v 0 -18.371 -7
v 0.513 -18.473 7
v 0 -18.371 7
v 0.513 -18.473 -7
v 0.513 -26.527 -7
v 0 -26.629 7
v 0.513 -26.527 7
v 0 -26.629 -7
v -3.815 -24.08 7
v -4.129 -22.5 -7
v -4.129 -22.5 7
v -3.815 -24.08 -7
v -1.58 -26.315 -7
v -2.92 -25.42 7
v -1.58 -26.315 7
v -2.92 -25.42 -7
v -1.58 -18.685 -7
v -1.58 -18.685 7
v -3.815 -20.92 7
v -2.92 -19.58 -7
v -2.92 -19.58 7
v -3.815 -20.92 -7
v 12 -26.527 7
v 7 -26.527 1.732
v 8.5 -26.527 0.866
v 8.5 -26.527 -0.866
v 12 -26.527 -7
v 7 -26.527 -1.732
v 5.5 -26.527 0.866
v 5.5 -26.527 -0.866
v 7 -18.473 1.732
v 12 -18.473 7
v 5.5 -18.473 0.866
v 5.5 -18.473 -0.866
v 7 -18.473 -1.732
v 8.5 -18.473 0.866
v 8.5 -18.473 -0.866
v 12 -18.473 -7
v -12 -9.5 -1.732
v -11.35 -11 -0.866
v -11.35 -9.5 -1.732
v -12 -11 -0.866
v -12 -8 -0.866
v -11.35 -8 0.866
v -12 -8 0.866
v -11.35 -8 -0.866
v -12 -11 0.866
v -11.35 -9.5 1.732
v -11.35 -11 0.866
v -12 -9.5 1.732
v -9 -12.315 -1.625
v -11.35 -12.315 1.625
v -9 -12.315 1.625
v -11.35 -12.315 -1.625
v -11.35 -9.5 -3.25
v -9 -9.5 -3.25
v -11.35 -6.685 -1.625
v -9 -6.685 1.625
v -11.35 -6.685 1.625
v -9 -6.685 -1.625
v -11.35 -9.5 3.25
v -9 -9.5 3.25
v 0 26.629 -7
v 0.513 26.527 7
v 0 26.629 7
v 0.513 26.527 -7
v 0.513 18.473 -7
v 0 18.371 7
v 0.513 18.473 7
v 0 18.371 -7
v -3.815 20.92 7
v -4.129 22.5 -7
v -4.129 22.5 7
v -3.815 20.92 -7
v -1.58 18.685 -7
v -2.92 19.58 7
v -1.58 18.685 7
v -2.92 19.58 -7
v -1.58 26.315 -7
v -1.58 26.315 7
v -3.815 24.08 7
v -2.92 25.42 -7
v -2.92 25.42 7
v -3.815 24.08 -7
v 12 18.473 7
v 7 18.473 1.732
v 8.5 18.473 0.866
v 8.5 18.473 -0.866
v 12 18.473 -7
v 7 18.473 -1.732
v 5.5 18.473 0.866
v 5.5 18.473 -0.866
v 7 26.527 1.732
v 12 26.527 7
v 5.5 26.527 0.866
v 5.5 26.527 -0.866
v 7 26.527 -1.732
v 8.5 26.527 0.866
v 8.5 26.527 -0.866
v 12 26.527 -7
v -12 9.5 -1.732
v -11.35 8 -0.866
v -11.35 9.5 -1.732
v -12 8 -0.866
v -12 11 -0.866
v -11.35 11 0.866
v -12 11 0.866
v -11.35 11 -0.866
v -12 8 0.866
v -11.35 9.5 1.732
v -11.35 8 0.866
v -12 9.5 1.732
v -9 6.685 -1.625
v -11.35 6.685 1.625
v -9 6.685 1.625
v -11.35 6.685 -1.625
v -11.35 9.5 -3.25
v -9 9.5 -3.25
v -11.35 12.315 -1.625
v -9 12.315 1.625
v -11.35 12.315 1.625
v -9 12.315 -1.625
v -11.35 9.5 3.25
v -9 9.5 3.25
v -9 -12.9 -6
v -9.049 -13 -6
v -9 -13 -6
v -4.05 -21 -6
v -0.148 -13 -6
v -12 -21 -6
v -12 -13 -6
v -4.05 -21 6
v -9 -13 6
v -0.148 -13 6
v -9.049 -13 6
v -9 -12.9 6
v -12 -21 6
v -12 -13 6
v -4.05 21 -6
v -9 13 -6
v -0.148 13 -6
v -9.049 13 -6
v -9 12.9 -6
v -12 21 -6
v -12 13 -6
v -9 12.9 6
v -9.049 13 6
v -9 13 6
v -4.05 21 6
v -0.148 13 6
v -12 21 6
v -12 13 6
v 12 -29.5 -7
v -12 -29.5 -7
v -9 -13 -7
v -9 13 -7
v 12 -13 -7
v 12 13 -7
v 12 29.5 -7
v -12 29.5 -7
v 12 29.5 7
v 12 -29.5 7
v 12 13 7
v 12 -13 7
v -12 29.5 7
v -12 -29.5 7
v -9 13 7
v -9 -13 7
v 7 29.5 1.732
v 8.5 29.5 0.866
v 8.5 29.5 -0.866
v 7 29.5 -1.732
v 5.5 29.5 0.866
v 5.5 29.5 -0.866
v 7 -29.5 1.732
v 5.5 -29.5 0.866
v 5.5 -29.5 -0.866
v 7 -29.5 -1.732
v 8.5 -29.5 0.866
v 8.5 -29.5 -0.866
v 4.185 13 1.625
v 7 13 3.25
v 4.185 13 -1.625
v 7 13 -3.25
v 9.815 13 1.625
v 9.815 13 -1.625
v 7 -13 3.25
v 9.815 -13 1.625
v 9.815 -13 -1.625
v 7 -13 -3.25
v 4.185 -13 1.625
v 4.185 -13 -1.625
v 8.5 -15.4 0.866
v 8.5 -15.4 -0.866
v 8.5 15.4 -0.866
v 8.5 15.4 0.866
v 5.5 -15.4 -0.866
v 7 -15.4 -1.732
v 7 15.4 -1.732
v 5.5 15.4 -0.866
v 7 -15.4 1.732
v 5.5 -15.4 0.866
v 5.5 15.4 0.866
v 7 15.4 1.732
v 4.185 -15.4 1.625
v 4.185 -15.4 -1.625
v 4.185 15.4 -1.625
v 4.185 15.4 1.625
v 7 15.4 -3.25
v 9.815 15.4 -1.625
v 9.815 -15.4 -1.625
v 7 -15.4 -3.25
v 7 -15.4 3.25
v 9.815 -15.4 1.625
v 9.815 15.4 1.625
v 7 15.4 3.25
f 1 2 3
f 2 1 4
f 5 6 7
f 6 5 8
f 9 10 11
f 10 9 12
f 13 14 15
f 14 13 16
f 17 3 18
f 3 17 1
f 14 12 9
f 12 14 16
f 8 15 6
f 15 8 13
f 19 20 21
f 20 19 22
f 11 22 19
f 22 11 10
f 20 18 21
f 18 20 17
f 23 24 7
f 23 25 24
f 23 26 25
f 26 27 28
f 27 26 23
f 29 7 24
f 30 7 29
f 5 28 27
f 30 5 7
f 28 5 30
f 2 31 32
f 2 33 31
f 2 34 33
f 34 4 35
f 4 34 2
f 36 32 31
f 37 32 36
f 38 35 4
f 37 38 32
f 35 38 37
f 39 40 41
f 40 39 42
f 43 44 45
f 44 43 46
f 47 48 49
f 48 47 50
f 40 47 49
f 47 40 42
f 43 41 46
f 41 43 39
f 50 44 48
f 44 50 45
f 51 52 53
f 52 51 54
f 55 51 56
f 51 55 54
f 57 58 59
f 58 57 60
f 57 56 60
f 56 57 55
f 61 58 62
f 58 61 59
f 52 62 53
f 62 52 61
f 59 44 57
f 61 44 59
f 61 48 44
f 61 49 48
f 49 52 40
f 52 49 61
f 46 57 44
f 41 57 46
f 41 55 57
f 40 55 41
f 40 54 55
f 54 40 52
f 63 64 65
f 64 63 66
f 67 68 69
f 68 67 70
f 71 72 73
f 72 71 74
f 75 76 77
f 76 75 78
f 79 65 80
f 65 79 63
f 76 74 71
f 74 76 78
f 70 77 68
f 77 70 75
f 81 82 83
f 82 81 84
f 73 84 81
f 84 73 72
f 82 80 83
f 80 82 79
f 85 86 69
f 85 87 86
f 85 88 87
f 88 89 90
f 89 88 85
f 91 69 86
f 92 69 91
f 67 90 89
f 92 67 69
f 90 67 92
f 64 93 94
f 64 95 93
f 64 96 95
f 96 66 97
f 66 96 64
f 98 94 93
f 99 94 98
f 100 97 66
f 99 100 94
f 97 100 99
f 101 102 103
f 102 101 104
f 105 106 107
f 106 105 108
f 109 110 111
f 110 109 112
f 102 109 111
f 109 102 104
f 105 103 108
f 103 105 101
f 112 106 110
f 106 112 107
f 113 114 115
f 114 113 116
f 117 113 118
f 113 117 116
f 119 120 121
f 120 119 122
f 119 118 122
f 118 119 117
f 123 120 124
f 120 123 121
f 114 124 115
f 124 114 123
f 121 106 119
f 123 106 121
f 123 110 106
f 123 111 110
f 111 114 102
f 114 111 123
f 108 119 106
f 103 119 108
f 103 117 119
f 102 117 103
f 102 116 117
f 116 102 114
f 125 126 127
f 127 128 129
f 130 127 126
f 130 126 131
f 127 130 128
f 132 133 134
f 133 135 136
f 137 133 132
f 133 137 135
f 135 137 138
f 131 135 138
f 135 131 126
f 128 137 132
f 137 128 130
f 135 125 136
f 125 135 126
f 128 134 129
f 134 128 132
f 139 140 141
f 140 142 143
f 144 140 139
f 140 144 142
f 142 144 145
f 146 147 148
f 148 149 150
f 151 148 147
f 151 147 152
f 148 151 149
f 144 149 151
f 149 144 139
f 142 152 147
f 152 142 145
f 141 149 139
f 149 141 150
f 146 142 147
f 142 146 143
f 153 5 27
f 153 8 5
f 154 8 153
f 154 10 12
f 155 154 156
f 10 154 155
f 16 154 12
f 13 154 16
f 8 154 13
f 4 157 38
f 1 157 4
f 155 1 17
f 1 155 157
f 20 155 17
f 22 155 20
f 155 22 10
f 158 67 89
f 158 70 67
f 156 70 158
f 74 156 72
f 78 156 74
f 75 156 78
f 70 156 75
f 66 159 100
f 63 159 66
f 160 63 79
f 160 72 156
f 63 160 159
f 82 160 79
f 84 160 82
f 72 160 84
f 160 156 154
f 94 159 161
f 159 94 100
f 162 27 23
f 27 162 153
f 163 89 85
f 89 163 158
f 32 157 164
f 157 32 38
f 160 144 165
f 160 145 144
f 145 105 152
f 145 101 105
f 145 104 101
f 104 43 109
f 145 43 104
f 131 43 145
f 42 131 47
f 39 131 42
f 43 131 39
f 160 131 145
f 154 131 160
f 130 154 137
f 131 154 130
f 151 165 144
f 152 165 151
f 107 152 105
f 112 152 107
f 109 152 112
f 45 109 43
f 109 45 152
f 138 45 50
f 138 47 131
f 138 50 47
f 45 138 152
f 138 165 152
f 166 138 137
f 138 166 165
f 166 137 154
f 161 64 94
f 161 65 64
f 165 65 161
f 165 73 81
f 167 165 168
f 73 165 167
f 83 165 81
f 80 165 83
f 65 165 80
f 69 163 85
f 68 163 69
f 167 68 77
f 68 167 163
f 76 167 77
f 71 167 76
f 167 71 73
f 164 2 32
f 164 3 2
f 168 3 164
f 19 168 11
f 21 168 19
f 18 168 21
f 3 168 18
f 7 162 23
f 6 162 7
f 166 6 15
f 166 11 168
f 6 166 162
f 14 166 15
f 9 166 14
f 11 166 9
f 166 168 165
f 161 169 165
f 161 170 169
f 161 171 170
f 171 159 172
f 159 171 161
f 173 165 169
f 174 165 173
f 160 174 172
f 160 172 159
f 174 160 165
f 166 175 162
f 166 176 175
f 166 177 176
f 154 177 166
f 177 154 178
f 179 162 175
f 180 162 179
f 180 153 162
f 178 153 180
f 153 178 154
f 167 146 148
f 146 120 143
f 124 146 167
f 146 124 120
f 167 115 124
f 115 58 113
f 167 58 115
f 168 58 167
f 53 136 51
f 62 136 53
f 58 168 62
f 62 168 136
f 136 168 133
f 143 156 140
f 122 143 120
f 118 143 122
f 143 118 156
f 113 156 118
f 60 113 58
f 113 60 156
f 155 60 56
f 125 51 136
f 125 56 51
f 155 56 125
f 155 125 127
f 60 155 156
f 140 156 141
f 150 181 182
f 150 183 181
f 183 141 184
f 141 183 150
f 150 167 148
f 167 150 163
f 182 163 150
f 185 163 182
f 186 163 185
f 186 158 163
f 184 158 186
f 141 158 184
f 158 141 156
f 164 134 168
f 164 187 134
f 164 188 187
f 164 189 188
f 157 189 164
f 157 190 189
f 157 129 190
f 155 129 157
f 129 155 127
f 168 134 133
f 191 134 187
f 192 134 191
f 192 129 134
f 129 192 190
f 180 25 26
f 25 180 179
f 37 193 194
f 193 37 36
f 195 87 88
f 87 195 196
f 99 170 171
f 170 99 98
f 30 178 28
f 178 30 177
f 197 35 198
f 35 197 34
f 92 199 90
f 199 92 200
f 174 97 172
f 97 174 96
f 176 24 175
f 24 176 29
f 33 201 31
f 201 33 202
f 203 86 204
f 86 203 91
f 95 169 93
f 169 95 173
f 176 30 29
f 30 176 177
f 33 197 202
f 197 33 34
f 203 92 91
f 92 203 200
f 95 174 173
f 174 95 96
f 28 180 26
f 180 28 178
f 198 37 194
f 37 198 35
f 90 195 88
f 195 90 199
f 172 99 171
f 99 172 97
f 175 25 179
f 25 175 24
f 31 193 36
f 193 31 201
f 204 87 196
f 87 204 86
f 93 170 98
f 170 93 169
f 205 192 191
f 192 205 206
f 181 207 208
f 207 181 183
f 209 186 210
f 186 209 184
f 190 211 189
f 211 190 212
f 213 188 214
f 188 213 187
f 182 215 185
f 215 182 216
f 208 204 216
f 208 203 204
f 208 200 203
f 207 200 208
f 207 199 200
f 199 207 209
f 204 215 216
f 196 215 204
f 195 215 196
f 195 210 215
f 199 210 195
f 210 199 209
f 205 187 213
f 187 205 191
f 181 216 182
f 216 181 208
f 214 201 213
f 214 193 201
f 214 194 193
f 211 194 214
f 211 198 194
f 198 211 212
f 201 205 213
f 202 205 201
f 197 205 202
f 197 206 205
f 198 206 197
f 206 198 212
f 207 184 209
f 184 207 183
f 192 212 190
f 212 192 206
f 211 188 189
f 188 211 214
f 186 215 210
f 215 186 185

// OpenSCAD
// file: config.scad
// modules
module_body_size = [25, 50, 10];
module_mount_edge_offset = 5;
module_level_bolt_size = 4;
module_level_spring_diameter = 8;
module_level_bolt_spacing = module_body_size[1] - 2*module_mount_edge_offset;
module_clamp_bolt_size = 4;
module_clamp_bolt_head_height = 3.5;

// main body
body_wall_thickness = 5;
body_size = [2*module_body_size[0]+2*body_wall_thickness+1, module_body_size[1]+2*body_wall_thickness+1, 55];
carriage_mount_hole_spacing=22.5;	// i3 rework standard
carriage_screw_size = 4;
carriage_screw_head_height = 2.5;
hotend_fan_output = 49;
hotend_fan_screw_spacing = 40;
hotend_fan_screw_size = 4;
blower_screw_spacing = 40;
blower_screw_size = 4;

// misc
body_chamfer = 2;
layer_height = 0.3;
tolerance = 0.1;
pf = 0.1;  // preview fix for z-buffer tearing on cuts
// main file
use <MCAD/polyholes.scad>
include <MCAD/nuts_and_bolts.scad>
include <config.scad>

rod_spacing = 45;
rod_diameter = 8;
rod_center_to_endstop_offset = 12;
thickness = 3;
bolt_diameter = 3;
endstop_bolt_spacing = 19;
endstop_wiring_offset = 17;
endstop_wiring_size = [12, 8, 8];
endstop_width = 11;

width = endstop_width + thickness;
depth = rod_center_to_endstop_offset + rod_diameter + 4;
length = rod_spacing + rod_diameter + 2*thickness;

rotate([0, 90, 0])
{
    endstop();
}

module endstop()
{
    difference()
    {
        translate([-width/2, -length/2, -rod_center_to_endstop_offset])
        {
            cube([width, length, depth]);
        }
        
        center_cut_length = 2*endstop_wiring_offset - endstop_wiring_size[1];
        center_cut_depth = depth-thickness+pf;
        center_cut_offset = rod_center_to_endstop_offset - center_cut_depth/2 - thickness;
        translate([0, 0, -center_cut_offset])
        {
            cube([width+pf, center_cut_length, center_cut_depth], true);
        }
        
        for(y=[-1:2:1])
        {
            rod_offset = rod_spacing/2;
            translate([-width/2 - pf/2, y*rod_offset, 0])
            {
                rotate([0, 90, 0])
                {
                    polyhole(width+pf, rod_diameter+tolerance);
                    
                    hull()
                    {
                        polyhole(width+pf, rod_diameter-tolerance);
                    
                        translate([-depth/2, 0, 0])
                        {
                            polyhole(width+pf, rod_diameter-tolerance);
                        }
                    }
                }
            }
            
            endstop_bolt_length = thickness+pf;
            translate([0, y*endstop_bolt_spacing/2, -rod_center_to_endstop_offset - pf/2])
            {
                polyhole(endstop_bolt_length, bolt_diameter);
                
                translate([0, 0, thickness-METRIC_NUT_THICKNESS[bolt_diameter] + pf])
                {
                    cylinder(d=METRIC_NUT_AC_WIDTHS[bolt_diameter]+tolerance, h=METRIC_NUT_THICKNESS[bolt_diameter], $fn=6);
                }
            }
            
            translate([-endstop_wiring_size[0]/2, y*endstop_wiring_offset - endstop_wiring_size[1]/2, -rod_center_to_endstop_offset-pf/2])
            {
                cube(endstop_wiring_size);
            }
            
            rotate([0, 0, y == 1 ? 180 : 0])
            translate([-endstop_wiring_size[0]/2, -endstop_wiring_offset - endstop_wiring_size[1]/2, -rod_center_to_endstop_offset-pf/2 + endstop_wiring_size[2]])
            {
                rotate([-64, 0, 0])
                {
                    cube([endstop_wiring_size[0], endstop_wiring_size[1], 2*endstop_wiring_size[2]]);
                }
            }
        }
        
        mounting_hardware_z_offset = -rod_center_to_endstop_offset + depth - 5;
        translate([0, length/2+pf/2, mounting_hardware_z_offset])
        {
            rotate([90, 0, 0])
            {
                polyhole(length+pf, bolt_diameter);
            }
        }
        
        translate([0, center_cut_length/2 + METRIC_NUT_THICKNESS[bolt_diameter], mounting_hardware_z_offset])
        {
            rotate([90, 0, 0])
            {
                cylinder(d=METRIC_NUT_AC_WIDTHS[bolt_diameter]+tolerance, h=center_cut_length + 2*METRIC_NUT_THICKNESS[bolt_diameter], $fn=6);
            }
        }
    }
}
